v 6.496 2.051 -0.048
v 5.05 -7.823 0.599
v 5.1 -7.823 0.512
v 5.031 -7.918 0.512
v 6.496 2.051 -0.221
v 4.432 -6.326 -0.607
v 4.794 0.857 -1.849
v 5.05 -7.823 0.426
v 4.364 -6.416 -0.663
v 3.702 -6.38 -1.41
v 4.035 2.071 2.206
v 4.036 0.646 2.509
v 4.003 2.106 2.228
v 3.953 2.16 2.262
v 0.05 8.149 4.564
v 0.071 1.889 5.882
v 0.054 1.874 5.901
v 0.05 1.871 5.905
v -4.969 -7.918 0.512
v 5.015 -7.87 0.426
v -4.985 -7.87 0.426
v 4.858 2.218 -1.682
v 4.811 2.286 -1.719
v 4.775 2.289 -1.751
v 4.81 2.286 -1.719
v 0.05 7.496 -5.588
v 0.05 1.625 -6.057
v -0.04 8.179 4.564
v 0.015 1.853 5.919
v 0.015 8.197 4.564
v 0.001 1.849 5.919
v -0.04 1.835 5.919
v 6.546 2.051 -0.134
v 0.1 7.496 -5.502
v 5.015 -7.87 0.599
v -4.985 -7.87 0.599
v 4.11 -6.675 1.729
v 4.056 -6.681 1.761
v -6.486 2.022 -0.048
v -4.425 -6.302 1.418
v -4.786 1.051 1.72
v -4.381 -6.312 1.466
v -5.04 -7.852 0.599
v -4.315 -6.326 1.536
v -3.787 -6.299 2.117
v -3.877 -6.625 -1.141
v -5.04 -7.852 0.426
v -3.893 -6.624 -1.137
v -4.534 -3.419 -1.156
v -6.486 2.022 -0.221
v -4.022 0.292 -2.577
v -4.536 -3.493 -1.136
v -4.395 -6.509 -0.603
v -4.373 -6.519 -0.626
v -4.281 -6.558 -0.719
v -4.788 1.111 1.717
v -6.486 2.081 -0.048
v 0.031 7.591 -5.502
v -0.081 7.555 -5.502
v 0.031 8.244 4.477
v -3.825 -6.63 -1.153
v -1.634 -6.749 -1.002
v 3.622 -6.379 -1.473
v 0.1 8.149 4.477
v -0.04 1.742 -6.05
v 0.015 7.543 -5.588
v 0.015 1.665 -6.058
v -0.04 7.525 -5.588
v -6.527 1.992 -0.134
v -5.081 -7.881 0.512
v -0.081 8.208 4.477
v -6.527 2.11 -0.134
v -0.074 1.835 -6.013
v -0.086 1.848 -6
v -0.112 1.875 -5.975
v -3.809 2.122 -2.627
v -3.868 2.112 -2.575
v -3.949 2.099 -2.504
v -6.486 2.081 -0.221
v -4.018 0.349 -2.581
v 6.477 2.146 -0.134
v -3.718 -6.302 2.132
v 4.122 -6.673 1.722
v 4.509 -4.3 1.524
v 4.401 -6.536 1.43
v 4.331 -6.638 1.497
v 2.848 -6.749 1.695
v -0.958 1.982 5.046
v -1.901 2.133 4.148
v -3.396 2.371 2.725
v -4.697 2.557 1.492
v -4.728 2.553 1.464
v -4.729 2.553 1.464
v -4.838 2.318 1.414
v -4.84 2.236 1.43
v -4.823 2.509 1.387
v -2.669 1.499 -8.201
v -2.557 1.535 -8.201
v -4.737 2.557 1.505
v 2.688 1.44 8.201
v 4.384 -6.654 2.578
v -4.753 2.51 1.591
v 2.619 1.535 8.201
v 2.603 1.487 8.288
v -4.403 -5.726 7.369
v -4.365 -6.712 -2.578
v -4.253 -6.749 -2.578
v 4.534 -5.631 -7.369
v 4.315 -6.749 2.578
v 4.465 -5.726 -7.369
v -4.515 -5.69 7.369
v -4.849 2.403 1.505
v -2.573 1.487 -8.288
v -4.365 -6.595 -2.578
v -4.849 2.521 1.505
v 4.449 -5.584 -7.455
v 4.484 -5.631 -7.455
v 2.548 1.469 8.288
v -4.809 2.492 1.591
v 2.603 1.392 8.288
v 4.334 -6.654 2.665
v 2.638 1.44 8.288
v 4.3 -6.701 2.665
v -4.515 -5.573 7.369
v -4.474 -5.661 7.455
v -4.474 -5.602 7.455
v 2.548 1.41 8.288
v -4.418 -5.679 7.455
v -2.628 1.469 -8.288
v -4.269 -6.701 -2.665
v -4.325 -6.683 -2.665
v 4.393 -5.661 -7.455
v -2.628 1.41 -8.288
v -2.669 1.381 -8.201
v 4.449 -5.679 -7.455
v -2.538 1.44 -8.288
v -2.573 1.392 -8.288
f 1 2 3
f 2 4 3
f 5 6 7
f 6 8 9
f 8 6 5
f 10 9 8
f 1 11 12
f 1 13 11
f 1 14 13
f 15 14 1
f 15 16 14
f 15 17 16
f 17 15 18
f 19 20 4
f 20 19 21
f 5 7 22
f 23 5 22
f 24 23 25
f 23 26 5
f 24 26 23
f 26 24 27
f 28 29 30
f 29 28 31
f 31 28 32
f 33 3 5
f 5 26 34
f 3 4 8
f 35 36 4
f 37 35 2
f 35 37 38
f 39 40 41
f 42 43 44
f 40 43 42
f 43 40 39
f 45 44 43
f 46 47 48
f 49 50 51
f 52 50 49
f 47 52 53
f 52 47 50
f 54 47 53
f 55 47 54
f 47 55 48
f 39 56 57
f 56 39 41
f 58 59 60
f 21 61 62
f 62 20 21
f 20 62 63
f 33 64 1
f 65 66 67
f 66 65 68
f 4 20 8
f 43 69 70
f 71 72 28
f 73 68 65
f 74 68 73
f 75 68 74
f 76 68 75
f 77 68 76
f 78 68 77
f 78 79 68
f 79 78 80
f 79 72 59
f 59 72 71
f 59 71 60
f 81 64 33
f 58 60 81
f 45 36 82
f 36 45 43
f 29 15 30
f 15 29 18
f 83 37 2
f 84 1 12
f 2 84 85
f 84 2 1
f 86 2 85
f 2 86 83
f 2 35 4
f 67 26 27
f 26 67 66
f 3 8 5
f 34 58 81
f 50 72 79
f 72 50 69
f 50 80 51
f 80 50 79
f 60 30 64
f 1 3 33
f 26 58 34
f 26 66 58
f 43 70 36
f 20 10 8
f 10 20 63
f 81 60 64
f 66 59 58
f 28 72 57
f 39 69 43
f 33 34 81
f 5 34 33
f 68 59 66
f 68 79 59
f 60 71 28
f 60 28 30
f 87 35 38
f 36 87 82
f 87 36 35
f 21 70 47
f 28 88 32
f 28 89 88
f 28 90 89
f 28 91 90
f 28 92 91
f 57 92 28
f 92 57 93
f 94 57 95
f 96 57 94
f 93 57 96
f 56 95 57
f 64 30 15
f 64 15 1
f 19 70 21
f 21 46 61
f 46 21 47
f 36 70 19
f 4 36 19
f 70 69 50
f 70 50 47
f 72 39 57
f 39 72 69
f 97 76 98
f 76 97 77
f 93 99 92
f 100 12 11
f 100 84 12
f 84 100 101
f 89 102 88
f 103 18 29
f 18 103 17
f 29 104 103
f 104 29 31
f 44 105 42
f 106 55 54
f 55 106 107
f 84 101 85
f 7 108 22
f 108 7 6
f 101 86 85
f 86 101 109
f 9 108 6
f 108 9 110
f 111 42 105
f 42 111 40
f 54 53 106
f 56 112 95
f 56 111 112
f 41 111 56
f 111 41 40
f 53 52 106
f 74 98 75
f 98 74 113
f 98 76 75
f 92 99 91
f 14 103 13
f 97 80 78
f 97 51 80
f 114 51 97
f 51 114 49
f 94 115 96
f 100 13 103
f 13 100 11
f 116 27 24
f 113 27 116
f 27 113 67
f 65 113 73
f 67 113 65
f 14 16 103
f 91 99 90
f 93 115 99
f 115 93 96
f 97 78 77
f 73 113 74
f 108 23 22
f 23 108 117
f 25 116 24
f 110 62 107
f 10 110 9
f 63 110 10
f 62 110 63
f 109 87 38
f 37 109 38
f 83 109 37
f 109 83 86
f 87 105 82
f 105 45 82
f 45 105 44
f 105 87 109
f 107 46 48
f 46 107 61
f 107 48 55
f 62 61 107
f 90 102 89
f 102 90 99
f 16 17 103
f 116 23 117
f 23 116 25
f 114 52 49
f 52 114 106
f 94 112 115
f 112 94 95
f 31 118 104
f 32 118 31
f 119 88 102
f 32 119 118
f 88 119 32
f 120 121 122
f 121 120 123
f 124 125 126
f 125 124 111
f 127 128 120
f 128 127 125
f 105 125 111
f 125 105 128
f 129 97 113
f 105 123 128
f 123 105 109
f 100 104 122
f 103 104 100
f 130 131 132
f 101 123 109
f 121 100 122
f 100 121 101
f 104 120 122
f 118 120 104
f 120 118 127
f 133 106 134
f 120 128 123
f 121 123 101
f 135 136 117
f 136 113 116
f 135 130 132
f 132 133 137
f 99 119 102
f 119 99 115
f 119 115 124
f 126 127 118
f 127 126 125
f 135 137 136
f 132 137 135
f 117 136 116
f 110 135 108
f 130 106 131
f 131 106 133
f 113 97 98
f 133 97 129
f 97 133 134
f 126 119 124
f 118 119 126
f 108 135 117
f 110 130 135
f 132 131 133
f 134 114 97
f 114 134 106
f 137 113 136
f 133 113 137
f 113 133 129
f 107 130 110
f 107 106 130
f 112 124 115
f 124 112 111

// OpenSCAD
// Auto-generated OpenSCAD file

    inner_points = 10*[[-0.44338942496134576, -0.5631291440797384, 0.736853897056677], [0.258799636920154, 0.14397761227363534, 0.8201038609809336], [-0.25879980510935924, 0.14397747926995844, -0.8201039287466986], [0.44338919068963584, -0.5631293267497549, -0.7368538292909121], [-0.4284186803233596, -0.6653657601513122, -0.2577935536208068], [0.47682137191431595, 0.24621402912054582, -0.1504703186366988], [-0.47682153054903015, 0.24621410252250395, 0.15047023127520603], [0.42841843649715877, -0.6653657507776369, 0.25779364098229957]];

    outer_points = 10*[[0.4999998558605856, -0.7822559369703687, 0.051219988111338946], [-0.5000001441354547, -0.7822559369703687, 0.05121717394836035], [1.5482124809305407e-06, 0.7495881473432447, -0.5501502552287388], [-1.259937611829569e-06, 0.8149237265974926, 0.4477130931690396], [0.6445843110171734, 0.20512235240503623, -0.01342867001218147], [-0.6445842354260318, 0.20512235240503623, -0.013432297942578041], [1.7722938158523331e-06, -0.2472366392743148, -0.629776537226624], [-1.8478849574399043e-06, -0.16300806553575767, 0.6566375051813835]];

    // Convex hull for inner set (I)
    module inner_hull() {
        hull() {
            for (p = inner_points) {
                translate(p) sphere(r=0.1);
            }
        }
    }

    // Convex hull for outer set (O) minus inner hull (O \ I)
    module outer_minus_inner() {
        difference() {
            hull() {
                for (p = outer_points) {
                    translate(p) sphere(r=0.1);
                }
            }
            inner_hull(); // Subtract inner hull
        }
    }

    // Convex hull for outer set (O) minus all translated inner hulls
    module outer_minus_AllTranslationInner() {
        difference() {
            hull() {
                for (p = outer_points) {
                    translate(p) sphere(r=0.1);
                }
            }
            hull() {
                translate([0,0,50]) inner_hull();
                translate([0,0,-50]) inner_hull();
            }; // Subtract translated inner hulls
        }
    }

    // Difference between outer_minus_inner and outer_minus_AllTranslationInner
    module outer_minus_inner_diff() {
        difference() {
            // Outer minus inner
            difference() {
                hull() {
                    for (p = outer_points) {
                        translate(p) sphere(r=0.1);
                    }
                }
                inner_hull();
            }

            // Subtract Outer minus AllTranslationInner
            difference() {
                hull() {
                    for (p = outer_points) {
                        translate(p) sphere(r=0.1);
                    }
                }
                hull() {
                    translate([0,0,50]) inner_hull();
                    translate([0,0,-50]) inner_hull();
                };
            }
        }
    }

    // Rendering all with colors applied
    color([1, 0, 0, 0.5]) inner_hull(); // Transparent red
    color([0, 1, 0, 1]) outer_minus_AllTranslationInner(); // Opaque green
    color([1, 1, 0, 1]) outer_minus_inner_diff(); // Opaque yellow
    
